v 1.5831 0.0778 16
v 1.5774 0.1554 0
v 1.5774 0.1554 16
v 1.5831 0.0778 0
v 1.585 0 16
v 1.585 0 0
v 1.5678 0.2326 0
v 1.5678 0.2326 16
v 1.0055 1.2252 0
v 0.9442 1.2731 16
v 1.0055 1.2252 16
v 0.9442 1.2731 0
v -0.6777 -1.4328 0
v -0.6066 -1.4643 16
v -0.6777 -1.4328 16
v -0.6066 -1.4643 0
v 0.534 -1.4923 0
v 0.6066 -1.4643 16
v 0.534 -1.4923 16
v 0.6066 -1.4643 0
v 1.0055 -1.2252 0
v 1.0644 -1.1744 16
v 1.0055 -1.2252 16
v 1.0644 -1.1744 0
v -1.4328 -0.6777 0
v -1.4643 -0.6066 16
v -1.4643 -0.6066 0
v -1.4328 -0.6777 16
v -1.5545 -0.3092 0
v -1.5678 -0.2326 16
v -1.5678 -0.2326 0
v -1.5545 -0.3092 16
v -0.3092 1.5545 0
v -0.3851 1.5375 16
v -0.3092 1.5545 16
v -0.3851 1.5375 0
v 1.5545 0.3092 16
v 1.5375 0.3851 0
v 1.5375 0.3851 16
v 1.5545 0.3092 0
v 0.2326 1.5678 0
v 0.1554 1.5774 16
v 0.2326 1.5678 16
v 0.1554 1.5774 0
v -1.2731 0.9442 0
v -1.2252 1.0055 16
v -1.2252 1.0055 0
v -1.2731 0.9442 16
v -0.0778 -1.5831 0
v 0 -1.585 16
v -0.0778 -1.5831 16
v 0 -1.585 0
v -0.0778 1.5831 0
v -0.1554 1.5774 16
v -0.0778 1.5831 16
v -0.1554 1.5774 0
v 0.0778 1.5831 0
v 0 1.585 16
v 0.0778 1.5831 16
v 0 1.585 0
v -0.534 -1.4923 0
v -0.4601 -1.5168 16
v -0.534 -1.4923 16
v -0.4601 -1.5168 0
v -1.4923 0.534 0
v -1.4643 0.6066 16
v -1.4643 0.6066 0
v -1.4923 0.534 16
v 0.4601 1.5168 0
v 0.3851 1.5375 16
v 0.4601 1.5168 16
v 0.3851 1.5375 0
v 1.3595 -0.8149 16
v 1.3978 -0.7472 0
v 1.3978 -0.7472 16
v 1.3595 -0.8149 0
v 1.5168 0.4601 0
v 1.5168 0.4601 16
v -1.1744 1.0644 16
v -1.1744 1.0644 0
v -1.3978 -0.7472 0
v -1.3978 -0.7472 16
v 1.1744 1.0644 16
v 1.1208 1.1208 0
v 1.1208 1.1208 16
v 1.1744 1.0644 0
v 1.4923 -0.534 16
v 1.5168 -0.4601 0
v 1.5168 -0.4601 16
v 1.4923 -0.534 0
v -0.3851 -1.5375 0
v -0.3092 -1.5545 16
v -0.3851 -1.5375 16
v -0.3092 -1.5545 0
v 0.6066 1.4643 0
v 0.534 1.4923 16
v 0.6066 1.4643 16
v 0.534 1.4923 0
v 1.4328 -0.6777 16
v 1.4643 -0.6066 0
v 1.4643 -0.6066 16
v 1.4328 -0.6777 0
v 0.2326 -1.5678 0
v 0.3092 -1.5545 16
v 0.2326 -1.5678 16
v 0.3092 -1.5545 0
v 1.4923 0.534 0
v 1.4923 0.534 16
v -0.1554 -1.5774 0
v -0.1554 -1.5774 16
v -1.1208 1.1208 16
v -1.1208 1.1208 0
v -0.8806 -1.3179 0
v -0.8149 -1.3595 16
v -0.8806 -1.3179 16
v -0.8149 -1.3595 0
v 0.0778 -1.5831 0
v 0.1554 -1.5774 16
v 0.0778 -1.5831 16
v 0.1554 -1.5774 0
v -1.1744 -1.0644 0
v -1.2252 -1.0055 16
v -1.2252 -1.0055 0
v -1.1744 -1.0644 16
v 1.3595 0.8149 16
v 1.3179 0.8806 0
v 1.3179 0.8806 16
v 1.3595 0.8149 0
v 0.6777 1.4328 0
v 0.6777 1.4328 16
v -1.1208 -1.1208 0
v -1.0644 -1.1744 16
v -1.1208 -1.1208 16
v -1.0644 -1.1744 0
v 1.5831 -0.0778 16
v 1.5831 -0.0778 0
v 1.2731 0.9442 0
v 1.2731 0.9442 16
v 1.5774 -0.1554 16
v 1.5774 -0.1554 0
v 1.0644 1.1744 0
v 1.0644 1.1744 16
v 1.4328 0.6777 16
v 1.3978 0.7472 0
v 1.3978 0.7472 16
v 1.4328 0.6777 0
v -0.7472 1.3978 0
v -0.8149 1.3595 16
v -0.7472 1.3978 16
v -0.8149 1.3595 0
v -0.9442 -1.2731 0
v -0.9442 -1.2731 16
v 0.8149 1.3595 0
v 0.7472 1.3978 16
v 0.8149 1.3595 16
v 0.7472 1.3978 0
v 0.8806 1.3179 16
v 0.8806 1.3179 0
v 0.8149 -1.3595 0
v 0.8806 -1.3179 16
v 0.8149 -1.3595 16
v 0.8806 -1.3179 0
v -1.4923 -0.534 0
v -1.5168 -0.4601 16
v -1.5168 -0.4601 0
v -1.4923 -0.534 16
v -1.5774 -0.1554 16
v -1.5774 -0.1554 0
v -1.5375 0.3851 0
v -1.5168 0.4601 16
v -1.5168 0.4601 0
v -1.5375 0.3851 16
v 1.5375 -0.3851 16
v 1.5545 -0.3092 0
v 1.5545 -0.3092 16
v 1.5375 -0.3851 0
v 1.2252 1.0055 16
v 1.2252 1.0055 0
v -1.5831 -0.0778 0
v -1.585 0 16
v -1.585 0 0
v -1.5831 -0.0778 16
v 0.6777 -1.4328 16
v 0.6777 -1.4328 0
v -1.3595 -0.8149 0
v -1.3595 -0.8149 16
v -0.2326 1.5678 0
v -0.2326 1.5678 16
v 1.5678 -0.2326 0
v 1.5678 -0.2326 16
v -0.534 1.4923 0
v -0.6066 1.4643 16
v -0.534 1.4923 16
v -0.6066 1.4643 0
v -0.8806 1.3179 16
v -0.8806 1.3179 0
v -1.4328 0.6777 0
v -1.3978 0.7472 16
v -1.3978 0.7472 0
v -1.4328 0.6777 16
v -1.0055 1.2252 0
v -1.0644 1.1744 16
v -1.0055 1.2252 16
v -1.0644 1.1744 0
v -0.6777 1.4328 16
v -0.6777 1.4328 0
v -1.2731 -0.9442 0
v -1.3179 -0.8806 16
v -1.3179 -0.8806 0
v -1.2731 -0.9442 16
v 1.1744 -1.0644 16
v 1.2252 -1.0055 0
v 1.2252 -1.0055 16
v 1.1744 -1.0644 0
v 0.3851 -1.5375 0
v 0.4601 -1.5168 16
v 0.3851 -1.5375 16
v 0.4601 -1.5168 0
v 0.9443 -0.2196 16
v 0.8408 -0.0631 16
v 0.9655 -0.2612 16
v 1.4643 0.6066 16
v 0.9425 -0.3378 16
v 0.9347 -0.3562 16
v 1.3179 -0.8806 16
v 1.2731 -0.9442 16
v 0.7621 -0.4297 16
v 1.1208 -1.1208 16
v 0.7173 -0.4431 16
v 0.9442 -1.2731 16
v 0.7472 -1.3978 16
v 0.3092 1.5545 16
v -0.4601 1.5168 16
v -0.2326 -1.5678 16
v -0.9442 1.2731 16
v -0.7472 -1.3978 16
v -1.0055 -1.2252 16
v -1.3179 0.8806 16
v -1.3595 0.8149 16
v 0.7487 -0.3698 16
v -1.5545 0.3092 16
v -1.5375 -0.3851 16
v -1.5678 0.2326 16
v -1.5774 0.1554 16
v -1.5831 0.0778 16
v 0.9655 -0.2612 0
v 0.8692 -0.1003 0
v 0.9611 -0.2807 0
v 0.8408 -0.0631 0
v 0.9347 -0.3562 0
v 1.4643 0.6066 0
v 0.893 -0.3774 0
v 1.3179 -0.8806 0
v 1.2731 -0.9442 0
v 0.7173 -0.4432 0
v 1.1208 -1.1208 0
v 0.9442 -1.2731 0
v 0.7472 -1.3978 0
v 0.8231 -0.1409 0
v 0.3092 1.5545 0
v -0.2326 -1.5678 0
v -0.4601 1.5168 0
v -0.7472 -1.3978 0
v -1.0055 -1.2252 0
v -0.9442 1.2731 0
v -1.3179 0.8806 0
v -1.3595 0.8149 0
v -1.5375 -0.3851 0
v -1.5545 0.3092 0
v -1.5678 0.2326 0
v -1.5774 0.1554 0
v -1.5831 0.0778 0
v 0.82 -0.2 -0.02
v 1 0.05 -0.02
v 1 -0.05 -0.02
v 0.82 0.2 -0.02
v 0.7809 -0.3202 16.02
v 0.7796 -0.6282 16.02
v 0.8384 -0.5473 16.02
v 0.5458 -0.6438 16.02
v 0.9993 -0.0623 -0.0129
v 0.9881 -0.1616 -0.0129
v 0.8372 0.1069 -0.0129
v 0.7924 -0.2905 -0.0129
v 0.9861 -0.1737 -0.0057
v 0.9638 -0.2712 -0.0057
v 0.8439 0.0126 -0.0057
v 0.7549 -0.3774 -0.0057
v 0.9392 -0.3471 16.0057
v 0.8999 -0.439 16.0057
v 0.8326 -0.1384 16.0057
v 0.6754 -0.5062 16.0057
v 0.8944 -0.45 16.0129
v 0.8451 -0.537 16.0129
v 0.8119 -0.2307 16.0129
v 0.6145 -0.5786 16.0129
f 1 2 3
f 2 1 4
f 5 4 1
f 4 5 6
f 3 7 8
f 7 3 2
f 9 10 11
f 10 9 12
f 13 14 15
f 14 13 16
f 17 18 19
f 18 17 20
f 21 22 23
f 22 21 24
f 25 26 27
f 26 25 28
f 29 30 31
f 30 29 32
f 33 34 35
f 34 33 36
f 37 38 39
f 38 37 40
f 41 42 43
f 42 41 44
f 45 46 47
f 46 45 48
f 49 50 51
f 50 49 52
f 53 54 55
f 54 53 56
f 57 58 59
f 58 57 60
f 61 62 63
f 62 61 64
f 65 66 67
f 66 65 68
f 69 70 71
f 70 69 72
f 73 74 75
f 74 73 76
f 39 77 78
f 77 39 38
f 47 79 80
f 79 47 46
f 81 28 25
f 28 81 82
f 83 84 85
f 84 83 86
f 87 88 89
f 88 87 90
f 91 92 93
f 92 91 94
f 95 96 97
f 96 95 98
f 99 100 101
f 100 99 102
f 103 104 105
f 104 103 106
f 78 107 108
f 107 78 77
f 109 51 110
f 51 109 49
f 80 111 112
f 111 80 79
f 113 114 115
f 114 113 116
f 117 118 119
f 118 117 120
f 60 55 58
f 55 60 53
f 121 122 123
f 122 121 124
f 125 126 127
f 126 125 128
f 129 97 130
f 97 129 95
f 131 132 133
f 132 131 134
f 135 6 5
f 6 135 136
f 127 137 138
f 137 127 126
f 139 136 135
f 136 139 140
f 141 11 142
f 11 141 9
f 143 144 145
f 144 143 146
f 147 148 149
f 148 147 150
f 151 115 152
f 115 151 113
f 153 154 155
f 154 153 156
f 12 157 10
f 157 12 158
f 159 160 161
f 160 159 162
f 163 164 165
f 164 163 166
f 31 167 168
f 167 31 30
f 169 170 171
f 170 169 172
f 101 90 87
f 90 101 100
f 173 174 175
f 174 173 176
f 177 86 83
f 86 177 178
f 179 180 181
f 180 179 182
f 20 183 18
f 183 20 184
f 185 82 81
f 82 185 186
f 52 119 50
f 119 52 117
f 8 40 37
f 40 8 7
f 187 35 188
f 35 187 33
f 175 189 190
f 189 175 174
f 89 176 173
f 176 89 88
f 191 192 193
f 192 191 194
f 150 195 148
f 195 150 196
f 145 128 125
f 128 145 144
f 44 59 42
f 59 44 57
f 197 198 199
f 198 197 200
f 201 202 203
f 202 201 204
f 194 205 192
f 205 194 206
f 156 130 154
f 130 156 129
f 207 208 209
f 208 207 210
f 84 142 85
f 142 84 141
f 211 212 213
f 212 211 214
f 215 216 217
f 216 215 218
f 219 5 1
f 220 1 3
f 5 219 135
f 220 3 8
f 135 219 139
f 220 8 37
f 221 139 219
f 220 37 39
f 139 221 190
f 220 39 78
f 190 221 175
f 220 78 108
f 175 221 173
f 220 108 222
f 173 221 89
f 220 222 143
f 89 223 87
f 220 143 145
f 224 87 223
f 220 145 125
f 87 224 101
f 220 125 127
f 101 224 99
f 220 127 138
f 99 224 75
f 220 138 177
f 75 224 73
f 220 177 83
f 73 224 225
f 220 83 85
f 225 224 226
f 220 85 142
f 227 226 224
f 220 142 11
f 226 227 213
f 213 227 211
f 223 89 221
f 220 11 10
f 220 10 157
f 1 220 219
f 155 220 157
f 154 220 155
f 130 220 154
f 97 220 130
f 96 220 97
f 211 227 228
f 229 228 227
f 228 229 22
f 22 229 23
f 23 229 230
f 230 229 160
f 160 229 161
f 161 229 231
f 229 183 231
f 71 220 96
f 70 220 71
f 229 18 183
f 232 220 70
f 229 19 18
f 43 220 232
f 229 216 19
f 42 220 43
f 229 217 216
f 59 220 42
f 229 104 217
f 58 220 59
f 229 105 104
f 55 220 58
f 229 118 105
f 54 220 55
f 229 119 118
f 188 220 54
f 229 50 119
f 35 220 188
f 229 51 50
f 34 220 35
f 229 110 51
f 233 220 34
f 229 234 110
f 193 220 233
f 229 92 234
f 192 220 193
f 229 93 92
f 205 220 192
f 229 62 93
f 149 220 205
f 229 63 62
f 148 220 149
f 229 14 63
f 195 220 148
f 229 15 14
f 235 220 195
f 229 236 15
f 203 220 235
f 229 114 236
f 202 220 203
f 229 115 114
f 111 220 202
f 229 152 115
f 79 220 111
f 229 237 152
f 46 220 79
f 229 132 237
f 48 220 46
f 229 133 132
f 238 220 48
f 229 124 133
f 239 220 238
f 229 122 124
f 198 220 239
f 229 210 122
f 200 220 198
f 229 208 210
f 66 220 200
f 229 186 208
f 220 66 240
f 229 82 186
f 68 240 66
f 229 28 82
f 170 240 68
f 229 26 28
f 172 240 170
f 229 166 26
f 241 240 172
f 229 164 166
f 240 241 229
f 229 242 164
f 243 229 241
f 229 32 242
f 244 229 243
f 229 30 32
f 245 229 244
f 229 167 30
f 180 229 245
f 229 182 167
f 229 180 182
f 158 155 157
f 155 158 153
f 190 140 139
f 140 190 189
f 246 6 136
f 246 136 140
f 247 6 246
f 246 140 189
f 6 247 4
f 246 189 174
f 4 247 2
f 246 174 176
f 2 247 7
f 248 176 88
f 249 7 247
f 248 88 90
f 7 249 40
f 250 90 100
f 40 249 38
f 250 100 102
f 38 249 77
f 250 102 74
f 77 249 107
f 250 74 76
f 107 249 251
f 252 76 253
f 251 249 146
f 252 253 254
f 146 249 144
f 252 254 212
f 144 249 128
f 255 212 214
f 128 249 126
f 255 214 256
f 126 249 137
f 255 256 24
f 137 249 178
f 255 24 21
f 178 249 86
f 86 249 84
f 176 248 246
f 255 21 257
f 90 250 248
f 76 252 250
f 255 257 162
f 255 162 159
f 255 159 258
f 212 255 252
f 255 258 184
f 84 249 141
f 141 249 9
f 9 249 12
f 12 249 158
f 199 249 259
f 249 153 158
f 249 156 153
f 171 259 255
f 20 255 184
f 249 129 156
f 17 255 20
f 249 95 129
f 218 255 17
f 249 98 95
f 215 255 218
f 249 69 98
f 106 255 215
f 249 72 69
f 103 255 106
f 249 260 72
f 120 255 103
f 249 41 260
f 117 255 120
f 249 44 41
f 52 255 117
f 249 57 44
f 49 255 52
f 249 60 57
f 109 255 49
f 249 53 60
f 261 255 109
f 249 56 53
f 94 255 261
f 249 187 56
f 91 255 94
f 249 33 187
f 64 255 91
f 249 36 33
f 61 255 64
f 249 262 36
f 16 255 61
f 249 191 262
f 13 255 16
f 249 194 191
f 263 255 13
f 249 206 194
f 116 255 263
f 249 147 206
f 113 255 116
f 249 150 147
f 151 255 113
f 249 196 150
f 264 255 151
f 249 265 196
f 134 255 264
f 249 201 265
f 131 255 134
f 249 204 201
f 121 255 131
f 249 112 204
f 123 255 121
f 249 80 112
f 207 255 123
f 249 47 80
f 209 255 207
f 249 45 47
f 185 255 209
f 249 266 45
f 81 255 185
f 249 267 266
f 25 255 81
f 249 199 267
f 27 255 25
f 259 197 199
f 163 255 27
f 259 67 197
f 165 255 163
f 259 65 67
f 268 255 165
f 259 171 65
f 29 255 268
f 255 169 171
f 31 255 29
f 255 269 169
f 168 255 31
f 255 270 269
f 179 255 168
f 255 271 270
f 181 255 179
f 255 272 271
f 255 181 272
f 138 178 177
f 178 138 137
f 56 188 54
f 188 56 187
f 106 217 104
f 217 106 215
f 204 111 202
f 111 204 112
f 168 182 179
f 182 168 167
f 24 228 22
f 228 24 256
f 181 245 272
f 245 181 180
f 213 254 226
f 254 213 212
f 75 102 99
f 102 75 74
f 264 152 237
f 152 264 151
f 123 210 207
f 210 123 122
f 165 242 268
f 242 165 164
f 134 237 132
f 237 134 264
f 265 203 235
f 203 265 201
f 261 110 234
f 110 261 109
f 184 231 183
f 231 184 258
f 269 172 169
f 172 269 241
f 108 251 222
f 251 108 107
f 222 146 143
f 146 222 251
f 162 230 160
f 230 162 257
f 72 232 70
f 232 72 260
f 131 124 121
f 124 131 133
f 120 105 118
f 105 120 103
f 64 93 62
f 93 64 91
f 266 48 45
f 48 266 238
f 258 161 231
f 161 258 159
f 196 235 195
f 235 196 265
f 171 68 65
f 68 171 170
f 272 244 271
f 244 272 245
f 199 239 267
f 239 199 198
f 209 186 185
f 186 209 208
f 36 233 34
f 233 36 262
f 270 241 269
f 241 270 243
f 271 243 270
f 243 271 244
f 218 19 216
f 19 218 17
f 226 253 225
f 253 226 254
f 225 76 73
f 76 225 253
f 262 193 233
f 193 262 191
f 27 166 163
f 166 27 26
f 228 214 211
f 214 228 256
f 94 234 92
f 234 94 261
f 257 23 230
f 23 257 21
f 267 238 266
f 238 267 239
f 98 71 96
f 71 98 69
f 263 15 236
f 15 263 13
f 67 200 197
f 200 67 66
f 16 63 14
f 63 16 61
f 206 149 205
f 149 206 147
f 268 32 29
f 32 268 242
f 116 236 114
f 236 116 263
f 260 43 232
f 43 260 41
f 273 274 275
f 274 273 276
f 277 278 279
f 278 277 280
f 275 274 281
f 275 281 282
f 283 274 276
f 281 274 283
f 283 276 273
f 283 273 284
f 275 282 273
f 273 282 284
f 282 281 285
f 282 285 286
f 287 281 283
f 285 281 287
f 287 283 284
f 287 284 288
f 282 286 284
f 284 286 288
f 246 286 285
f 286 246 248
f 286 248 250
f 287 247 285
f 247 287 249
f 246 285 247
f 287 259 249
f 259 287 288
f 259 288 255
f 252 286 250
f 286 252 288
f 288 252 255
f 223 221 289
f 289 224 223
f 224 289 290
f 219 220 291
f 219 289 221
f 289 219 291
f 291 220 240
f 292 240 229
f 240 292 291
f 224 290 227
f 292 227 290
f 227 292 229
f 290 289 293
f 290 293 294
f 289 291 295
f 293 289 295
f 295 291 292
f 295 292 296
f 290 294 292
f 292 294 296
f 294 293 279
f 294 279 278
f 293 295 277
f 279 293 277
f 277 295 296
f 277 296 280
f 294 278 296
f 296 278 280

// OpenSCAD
$fn = 128;

// Standoff pillar with external thread
// Specs: 2.0mm thread (major dia), 16.0mm long, 3.17mm pillar diameter

length   = 16.0;   // overall length (mm)
outer_d  = 3.17;   // pillar diameter (mm)
thread_d = 2.0;    // thread major diameter (mm)

// Approximate ISO M2 external thread parameters
pitch        = 0.40;   // mm
thread_depth = 0.18;   // radial depth (visible but still within pillar)
minor_d      = thread_d - 2*thread_depth;

eps = 0.02;

assert(minor_d > 0, "Thread minor diameter must be > 0. Reduce thread_depth.");
assert(thread_d <= outer_d + 1e-6, "Thread major diameter must be <= pillar diameter.");

module external_thread_ridge(d_major, d_minor, h, p, slices_per_turn=48) {
    turns = h / p;
    steps = max(16, ceil(turns * slices_per_turn));
    twist_deg = 360 * turns;

    // 2D ridge profile in (radius, z-within-one-pitch)
    // Slightly asymmetric to avoid degeneracy and improve visibility
    profile = [
        [d_minor/2, -p/2],
        [d_major/2, -p/8],
        [d_major/2,  p/8],
        [d_minor/2,  p/2]
    ];

    linear_extrude(height=h, twist=twist_deg, slices=steps, convexity=10)
        polygon(points=profile);
}

union() {
    // Main pillar body
    cylinder(h=length, d=outer_d, center=false);

    // Thread ridge: start slightly below and extend slightly above for guaranteed overlap
    translate([0, 0, -eps])
        external_thread_ridge(thread_d, minor_d, length + 2*eps, pitch, slices_per_turn=56);
}
